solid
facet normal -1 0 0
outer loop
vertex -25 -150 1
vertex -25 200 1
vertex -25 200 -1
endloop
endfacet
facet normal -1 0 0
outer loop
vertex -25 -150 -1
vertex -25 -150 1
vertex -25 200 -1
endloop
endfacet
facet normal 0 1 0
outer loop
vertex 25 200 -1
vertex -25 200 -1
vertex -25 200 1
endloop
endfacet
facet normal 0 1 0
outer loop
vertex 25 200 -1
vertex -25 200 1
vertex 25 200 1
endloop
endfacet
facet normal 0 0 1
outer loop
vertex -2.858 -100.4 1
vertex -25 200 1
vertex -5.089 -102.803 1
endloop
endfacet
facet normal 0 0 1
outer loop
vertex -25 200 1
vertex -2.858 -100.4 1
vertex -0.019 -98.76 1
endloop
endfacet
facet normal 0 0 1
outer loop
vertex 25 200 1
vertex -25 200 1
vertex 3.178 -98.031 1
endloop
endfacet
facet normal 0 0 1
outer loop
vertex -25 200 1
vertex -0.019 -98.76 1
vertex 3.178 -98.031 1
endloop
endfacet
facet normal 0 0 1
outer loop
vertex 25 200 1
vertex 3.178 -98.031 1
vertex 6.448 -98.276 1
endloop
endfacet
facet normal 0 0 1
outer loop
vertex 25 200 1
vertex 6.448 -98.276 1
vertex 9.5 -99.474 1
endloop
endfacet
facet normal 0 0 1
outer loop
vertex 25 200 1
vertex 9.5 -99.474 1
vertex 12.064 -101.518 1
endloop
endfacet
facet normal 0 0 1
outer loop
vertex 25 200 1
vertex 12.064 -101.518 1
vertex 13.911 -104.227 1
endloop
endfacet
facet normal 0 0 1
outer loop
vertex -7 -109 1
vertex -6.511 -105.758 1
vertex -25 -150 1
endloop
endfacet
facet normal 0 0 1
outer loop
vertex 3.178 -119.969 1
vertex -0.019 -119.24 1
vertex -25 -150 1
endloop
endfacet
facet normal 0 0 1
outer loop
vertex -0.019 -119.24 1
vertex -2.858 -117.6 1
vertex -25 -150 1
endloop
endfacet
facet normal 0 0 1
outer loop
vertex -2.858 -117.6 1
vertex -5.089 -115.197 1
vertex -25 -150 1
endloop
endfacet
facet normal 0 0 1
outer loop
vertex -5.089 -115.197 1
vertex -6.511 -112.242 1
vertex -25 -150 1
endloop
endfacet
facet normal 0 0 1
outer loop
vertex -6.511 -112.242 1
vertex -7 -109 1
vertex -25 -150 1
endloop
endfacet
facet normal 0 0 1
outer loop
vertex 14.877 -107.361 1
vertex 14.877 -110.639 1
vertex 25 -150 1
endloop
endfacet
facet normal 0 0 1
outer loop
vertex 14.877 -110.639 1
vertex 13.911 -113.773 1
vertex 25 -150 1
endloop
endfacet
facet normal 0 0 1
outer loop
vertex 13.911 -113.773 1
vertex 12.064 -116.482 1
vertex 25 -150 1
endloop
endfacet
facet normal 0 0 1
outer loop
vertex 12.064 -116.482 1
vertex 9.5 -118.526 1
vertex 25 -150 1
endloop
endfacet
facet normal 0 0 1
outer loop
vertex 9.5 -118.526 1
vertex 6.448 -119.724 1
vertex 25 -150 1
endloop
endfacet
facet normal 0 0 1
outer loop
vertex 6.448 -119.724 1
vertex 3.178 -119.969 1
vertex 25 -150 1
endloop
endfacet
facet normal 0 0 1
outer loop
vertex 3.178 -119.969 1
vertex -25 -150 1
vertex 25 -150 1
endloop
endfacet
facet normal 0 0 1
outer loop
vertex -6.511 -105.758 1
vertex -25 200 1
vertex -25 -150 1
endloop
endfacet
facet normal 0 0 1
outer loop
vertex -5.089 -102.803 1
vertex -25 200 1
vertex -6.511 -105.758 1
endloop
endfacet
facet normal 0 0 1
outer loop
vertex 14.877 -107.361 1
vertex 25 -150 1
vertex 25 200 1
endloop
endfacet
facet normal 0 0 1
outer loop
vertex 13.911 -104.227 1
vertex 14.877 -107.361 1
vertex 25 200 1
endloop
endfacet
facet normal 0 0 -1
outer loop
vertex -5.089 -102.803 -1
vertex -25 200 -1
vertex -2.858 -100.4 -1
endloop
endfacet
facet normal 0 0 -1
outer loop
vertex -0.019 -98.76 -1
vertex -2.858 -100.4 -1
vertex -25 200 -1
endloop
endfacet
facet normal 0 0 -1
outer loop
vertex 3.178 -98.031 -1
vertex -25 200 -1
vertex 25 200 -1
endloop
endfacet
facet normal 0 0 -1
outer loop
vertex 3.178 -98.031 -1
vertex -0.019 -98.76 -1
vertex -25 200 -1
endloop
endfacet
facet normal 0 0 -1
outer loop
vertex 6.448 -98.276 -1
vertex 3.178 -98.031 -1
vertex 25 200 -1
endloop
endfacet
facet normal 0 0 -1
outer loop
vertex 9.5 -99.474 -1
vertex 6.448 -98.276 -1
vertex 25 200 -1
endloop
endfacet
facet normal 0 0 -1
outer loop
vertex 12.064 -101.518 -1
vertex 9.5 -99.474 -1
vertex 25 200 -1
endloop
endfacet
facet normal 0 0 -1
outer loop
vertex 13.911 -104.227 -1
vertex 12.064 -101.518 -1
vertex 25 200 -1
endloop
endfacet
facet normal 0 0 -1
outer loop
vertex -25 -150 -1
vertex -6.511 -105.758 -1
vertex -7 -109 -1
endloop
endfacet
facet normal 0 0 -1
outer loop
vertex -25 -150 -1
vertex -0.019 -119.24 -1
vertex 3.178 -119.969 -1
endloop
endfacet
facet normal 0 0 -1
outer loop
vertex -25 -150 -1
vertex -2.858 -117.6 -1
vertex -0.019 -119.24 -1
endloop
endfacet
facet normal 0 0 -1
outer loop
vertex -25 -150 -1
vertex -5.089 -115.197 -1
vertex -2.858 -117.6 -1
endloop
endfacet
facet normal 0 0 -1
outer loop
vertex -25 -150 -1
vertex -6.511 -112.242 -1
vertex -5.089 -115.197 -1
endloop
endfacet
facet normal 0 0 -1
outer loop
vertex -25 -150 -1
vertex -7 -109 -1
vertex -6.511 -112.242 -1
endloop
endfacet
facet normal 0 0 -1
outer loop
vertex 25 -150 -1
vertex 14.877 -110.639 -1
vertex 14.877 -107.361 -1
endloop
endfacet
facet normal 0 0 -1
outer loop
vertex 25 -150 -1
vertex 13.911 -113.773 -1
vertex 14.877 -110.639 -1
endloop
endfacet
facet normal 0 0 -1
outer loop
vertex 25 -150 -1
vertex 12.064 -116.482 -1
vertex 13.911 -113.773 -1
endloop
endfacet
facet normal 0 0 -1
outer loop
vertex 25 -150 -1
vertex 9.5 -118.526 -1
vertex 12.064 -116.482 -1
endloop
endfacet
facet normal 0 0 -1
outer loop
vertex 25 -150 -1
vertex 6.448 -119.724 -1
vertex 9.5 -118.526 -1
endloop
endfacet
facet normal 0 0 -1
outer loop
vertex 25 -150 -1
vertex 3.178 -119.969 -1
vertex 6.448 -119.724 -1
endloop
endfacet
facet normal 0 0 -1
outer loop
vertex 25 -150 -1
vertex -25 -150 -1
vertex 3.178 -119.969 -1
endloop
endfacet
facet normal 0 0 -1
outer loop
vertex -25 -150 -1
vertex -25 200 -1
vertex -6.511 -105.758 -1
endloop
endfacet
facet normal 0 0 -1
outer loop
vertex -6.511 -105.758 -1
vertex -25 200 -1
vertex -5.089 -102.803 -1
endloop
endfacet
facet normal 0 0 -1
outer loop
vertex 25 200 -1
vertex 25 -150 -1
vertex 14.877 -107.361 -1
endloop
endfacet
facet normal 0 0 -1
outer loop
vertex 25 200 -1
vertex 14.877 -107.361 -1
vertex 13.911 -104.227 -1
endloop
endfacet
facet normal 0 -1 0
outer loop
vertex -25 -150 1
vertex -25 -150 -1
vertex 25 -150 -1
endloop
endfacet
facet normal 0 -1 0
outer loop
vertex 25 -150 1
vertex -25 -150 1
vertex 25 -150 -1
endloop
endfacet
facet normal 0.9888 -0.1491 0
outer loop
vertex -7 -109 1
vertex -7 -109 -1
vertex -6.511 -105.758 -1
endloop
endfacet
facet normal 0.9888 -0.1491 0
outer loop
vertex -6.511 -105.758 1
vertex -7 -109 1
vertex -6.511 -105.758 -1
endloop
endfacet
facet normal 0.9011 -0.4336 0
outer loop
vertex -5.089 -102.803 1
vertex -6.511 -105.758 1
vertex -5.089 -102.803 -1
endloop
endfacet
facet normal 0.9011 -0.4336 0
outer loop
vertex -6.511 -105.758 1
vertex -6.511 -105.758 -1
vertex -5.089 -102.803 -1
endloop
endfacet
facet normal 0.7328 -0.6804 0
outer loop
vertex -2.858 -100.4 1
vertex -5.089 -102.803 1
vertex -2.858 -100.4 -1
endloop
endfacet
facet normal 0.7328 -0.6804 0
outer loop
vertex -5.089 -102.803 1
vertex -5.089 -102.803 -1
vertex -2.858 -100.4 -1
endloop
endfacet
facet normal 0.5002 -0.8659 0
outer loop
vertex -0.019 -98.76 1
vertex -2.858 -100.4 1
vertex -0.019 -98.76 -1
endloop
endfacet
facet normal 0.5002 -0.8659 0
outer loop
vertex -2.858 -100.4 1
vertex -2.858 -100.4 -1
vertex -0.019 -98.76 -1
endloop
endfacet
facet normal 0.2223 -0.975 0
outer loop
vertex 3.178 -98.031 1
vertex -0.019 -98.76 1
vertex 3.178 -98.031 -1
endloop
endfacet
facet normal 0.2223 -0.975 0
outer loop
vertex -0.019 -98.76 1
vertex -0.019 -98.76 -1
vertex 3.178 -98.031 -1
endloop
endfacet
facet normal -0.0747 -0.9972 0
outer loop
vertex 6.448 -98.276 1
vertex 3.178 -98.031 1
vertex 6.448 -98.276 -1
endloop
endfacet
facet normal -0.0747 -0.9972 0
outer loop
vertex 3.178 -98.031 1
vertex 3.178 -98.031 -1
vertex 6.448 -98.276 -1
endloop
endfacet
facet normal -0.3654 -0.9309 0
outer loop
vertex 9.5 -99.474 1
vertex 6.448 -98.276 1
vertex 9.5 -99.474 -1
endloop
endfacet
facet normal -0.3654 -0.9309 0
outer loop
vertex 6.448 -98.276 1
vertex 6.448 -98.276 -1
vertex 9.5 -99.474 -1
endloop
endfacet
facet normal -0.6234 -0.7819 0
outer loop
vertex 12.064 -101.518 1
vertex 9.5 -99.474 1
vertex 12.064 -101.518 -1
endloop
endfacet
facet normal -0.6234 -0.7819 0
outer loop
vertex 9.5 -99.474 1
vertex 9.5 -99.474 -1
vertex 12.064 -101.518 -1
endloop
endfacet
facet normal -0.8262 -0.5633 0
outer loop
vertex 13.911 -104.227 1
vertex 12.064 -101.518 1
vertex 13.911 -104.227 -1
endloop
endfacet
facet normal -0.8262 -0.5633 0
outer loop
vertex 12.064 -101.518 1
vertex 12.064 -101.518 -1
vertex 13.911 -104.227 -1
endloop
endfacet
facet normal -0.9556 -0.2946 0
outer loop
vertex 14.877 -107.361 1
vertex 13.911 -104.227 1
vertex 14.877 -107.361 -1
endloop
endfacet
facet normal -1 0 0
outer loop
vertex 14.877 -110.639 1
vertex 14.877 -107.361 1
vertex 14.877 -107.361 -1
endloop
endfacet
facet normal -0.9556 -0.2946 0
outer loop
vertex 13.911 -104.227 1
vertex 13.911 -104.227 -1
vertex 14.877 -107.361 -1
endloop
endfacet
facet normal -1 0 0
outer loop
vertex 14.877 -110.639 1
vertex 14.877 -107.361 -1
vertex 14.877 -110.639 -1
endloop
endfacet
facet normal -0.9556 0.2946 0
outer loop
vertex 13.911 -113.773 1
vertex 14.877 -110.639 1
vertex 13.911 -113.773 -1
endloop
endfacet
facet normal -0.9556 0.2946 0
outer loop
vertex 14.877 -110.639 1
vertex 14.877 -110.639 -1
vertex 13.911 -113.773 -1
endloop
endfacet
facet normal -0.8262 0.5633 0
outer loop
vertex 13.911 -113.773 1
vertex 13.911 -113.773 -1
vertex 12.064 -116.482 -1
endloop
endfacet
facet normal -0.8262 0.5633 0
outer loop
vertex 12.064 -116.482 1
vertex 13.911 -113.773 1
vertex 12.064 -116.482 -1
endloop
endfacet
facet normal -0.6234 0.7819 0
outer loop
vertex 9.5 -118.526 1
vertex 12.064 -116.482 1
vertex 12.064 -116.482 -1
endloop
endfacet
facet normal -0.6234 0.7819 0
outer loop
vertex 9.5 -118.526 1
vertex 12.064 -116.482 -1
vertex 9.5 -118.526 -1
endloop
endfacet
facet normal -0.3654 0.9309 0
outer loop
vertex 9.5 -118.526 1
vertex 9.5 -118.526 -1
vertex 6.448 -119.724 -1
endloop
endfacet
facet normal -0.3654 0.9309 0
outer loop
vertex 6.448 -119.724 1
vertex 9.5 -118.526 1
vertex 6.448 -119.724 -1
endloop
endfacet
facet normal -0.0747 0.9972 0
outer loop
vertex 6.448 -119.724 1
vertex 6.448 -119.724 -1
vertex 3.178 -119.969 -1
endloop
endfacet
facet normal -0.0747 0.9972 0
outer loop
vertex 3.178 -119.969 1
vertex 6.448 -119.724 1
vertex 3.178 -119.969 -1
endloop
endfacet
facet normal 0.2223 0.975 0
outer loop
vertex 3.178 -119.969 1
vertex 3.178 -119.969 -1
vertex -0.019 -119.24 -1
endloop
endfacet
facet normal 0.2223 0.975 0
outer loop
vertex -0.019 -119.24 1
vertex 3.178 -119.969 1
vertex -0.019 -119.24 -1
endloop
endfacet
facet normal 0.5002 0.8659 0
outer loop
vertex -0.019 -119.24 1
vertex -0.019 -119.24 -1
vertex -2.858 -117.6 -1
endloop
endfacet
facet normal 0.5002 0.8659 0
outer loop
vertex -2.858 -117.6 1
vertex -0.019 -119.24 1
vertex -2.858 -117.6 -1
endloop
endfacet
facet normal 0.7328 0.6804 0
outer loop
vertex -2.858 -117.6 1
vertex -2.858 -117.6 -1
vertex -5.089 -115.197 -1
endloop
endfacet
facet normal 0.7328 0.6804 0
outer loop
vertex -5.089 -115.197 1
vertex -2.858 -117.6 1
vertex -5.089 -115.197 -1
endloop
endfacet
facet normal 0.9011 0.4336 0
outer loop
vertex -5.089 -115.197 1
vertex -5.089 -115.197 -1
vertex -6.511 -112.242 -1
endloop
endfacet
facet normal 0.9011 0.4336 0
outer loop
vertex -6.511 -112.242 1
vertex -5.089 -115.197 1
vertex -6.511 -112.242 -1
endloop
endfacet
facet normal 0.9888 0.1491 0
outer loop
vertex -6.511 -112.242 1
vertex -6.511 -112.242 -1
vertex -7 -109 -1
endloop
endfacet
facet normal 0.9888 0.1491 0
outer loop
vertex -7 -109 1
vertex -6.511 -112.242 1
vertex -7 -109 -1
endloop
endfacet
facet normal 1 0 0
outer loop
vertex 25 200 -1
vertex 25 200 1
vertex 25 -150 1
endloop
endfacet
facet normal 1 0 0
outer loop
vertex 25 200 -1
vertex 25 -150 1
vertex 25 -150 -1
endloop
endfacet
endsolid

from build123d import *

# Parameters (mm, degrees)
BOSS_EXTRUDE1_DEPTH      = 200
BOSS_EXTRUDE1_DEPTH_BACK = 150
SKETCH1_W                = 50
SKETCH1_H                = 2
SKETCH2_R                = 11
CUT_EXTRUDE1_DEPTH       = 202.566366242


with BuildPart() as part:
    # Sketch1 → Boss-Extrude1 (new, two sides: drawn at the far end of the back side and taken through both)
    with BuildSketch(Plane(origin=(0, 0, 0), x_dir=(1, 0, 0), z_dir=(0, 1, 0)).offset(-BOSS_EXTRUDE1_DEPTH_BACK)):
        Rectangle(SKETCH1_W, SKETCH1_H)
    extrude(amount=BOSS_EXTRUDE1_DEPTH + BOSS_EXTRUDE1_DEPTH_BACK)

    # Sketch2 → Cut-Extrude1 (cut, through all)
    with BuildSketch(Plane(origin=(0, 0, -1), x_dir=(-1, 0, 0), z_dir=(0, 0, -1))):
        with Locations((-4, -109)):
            Circle(SKETCH2_R)
    extrude(amount=-CUT_EXTRUDE1_DEPTH, mode=Mode.SUBTRACT)


solid = part.part
